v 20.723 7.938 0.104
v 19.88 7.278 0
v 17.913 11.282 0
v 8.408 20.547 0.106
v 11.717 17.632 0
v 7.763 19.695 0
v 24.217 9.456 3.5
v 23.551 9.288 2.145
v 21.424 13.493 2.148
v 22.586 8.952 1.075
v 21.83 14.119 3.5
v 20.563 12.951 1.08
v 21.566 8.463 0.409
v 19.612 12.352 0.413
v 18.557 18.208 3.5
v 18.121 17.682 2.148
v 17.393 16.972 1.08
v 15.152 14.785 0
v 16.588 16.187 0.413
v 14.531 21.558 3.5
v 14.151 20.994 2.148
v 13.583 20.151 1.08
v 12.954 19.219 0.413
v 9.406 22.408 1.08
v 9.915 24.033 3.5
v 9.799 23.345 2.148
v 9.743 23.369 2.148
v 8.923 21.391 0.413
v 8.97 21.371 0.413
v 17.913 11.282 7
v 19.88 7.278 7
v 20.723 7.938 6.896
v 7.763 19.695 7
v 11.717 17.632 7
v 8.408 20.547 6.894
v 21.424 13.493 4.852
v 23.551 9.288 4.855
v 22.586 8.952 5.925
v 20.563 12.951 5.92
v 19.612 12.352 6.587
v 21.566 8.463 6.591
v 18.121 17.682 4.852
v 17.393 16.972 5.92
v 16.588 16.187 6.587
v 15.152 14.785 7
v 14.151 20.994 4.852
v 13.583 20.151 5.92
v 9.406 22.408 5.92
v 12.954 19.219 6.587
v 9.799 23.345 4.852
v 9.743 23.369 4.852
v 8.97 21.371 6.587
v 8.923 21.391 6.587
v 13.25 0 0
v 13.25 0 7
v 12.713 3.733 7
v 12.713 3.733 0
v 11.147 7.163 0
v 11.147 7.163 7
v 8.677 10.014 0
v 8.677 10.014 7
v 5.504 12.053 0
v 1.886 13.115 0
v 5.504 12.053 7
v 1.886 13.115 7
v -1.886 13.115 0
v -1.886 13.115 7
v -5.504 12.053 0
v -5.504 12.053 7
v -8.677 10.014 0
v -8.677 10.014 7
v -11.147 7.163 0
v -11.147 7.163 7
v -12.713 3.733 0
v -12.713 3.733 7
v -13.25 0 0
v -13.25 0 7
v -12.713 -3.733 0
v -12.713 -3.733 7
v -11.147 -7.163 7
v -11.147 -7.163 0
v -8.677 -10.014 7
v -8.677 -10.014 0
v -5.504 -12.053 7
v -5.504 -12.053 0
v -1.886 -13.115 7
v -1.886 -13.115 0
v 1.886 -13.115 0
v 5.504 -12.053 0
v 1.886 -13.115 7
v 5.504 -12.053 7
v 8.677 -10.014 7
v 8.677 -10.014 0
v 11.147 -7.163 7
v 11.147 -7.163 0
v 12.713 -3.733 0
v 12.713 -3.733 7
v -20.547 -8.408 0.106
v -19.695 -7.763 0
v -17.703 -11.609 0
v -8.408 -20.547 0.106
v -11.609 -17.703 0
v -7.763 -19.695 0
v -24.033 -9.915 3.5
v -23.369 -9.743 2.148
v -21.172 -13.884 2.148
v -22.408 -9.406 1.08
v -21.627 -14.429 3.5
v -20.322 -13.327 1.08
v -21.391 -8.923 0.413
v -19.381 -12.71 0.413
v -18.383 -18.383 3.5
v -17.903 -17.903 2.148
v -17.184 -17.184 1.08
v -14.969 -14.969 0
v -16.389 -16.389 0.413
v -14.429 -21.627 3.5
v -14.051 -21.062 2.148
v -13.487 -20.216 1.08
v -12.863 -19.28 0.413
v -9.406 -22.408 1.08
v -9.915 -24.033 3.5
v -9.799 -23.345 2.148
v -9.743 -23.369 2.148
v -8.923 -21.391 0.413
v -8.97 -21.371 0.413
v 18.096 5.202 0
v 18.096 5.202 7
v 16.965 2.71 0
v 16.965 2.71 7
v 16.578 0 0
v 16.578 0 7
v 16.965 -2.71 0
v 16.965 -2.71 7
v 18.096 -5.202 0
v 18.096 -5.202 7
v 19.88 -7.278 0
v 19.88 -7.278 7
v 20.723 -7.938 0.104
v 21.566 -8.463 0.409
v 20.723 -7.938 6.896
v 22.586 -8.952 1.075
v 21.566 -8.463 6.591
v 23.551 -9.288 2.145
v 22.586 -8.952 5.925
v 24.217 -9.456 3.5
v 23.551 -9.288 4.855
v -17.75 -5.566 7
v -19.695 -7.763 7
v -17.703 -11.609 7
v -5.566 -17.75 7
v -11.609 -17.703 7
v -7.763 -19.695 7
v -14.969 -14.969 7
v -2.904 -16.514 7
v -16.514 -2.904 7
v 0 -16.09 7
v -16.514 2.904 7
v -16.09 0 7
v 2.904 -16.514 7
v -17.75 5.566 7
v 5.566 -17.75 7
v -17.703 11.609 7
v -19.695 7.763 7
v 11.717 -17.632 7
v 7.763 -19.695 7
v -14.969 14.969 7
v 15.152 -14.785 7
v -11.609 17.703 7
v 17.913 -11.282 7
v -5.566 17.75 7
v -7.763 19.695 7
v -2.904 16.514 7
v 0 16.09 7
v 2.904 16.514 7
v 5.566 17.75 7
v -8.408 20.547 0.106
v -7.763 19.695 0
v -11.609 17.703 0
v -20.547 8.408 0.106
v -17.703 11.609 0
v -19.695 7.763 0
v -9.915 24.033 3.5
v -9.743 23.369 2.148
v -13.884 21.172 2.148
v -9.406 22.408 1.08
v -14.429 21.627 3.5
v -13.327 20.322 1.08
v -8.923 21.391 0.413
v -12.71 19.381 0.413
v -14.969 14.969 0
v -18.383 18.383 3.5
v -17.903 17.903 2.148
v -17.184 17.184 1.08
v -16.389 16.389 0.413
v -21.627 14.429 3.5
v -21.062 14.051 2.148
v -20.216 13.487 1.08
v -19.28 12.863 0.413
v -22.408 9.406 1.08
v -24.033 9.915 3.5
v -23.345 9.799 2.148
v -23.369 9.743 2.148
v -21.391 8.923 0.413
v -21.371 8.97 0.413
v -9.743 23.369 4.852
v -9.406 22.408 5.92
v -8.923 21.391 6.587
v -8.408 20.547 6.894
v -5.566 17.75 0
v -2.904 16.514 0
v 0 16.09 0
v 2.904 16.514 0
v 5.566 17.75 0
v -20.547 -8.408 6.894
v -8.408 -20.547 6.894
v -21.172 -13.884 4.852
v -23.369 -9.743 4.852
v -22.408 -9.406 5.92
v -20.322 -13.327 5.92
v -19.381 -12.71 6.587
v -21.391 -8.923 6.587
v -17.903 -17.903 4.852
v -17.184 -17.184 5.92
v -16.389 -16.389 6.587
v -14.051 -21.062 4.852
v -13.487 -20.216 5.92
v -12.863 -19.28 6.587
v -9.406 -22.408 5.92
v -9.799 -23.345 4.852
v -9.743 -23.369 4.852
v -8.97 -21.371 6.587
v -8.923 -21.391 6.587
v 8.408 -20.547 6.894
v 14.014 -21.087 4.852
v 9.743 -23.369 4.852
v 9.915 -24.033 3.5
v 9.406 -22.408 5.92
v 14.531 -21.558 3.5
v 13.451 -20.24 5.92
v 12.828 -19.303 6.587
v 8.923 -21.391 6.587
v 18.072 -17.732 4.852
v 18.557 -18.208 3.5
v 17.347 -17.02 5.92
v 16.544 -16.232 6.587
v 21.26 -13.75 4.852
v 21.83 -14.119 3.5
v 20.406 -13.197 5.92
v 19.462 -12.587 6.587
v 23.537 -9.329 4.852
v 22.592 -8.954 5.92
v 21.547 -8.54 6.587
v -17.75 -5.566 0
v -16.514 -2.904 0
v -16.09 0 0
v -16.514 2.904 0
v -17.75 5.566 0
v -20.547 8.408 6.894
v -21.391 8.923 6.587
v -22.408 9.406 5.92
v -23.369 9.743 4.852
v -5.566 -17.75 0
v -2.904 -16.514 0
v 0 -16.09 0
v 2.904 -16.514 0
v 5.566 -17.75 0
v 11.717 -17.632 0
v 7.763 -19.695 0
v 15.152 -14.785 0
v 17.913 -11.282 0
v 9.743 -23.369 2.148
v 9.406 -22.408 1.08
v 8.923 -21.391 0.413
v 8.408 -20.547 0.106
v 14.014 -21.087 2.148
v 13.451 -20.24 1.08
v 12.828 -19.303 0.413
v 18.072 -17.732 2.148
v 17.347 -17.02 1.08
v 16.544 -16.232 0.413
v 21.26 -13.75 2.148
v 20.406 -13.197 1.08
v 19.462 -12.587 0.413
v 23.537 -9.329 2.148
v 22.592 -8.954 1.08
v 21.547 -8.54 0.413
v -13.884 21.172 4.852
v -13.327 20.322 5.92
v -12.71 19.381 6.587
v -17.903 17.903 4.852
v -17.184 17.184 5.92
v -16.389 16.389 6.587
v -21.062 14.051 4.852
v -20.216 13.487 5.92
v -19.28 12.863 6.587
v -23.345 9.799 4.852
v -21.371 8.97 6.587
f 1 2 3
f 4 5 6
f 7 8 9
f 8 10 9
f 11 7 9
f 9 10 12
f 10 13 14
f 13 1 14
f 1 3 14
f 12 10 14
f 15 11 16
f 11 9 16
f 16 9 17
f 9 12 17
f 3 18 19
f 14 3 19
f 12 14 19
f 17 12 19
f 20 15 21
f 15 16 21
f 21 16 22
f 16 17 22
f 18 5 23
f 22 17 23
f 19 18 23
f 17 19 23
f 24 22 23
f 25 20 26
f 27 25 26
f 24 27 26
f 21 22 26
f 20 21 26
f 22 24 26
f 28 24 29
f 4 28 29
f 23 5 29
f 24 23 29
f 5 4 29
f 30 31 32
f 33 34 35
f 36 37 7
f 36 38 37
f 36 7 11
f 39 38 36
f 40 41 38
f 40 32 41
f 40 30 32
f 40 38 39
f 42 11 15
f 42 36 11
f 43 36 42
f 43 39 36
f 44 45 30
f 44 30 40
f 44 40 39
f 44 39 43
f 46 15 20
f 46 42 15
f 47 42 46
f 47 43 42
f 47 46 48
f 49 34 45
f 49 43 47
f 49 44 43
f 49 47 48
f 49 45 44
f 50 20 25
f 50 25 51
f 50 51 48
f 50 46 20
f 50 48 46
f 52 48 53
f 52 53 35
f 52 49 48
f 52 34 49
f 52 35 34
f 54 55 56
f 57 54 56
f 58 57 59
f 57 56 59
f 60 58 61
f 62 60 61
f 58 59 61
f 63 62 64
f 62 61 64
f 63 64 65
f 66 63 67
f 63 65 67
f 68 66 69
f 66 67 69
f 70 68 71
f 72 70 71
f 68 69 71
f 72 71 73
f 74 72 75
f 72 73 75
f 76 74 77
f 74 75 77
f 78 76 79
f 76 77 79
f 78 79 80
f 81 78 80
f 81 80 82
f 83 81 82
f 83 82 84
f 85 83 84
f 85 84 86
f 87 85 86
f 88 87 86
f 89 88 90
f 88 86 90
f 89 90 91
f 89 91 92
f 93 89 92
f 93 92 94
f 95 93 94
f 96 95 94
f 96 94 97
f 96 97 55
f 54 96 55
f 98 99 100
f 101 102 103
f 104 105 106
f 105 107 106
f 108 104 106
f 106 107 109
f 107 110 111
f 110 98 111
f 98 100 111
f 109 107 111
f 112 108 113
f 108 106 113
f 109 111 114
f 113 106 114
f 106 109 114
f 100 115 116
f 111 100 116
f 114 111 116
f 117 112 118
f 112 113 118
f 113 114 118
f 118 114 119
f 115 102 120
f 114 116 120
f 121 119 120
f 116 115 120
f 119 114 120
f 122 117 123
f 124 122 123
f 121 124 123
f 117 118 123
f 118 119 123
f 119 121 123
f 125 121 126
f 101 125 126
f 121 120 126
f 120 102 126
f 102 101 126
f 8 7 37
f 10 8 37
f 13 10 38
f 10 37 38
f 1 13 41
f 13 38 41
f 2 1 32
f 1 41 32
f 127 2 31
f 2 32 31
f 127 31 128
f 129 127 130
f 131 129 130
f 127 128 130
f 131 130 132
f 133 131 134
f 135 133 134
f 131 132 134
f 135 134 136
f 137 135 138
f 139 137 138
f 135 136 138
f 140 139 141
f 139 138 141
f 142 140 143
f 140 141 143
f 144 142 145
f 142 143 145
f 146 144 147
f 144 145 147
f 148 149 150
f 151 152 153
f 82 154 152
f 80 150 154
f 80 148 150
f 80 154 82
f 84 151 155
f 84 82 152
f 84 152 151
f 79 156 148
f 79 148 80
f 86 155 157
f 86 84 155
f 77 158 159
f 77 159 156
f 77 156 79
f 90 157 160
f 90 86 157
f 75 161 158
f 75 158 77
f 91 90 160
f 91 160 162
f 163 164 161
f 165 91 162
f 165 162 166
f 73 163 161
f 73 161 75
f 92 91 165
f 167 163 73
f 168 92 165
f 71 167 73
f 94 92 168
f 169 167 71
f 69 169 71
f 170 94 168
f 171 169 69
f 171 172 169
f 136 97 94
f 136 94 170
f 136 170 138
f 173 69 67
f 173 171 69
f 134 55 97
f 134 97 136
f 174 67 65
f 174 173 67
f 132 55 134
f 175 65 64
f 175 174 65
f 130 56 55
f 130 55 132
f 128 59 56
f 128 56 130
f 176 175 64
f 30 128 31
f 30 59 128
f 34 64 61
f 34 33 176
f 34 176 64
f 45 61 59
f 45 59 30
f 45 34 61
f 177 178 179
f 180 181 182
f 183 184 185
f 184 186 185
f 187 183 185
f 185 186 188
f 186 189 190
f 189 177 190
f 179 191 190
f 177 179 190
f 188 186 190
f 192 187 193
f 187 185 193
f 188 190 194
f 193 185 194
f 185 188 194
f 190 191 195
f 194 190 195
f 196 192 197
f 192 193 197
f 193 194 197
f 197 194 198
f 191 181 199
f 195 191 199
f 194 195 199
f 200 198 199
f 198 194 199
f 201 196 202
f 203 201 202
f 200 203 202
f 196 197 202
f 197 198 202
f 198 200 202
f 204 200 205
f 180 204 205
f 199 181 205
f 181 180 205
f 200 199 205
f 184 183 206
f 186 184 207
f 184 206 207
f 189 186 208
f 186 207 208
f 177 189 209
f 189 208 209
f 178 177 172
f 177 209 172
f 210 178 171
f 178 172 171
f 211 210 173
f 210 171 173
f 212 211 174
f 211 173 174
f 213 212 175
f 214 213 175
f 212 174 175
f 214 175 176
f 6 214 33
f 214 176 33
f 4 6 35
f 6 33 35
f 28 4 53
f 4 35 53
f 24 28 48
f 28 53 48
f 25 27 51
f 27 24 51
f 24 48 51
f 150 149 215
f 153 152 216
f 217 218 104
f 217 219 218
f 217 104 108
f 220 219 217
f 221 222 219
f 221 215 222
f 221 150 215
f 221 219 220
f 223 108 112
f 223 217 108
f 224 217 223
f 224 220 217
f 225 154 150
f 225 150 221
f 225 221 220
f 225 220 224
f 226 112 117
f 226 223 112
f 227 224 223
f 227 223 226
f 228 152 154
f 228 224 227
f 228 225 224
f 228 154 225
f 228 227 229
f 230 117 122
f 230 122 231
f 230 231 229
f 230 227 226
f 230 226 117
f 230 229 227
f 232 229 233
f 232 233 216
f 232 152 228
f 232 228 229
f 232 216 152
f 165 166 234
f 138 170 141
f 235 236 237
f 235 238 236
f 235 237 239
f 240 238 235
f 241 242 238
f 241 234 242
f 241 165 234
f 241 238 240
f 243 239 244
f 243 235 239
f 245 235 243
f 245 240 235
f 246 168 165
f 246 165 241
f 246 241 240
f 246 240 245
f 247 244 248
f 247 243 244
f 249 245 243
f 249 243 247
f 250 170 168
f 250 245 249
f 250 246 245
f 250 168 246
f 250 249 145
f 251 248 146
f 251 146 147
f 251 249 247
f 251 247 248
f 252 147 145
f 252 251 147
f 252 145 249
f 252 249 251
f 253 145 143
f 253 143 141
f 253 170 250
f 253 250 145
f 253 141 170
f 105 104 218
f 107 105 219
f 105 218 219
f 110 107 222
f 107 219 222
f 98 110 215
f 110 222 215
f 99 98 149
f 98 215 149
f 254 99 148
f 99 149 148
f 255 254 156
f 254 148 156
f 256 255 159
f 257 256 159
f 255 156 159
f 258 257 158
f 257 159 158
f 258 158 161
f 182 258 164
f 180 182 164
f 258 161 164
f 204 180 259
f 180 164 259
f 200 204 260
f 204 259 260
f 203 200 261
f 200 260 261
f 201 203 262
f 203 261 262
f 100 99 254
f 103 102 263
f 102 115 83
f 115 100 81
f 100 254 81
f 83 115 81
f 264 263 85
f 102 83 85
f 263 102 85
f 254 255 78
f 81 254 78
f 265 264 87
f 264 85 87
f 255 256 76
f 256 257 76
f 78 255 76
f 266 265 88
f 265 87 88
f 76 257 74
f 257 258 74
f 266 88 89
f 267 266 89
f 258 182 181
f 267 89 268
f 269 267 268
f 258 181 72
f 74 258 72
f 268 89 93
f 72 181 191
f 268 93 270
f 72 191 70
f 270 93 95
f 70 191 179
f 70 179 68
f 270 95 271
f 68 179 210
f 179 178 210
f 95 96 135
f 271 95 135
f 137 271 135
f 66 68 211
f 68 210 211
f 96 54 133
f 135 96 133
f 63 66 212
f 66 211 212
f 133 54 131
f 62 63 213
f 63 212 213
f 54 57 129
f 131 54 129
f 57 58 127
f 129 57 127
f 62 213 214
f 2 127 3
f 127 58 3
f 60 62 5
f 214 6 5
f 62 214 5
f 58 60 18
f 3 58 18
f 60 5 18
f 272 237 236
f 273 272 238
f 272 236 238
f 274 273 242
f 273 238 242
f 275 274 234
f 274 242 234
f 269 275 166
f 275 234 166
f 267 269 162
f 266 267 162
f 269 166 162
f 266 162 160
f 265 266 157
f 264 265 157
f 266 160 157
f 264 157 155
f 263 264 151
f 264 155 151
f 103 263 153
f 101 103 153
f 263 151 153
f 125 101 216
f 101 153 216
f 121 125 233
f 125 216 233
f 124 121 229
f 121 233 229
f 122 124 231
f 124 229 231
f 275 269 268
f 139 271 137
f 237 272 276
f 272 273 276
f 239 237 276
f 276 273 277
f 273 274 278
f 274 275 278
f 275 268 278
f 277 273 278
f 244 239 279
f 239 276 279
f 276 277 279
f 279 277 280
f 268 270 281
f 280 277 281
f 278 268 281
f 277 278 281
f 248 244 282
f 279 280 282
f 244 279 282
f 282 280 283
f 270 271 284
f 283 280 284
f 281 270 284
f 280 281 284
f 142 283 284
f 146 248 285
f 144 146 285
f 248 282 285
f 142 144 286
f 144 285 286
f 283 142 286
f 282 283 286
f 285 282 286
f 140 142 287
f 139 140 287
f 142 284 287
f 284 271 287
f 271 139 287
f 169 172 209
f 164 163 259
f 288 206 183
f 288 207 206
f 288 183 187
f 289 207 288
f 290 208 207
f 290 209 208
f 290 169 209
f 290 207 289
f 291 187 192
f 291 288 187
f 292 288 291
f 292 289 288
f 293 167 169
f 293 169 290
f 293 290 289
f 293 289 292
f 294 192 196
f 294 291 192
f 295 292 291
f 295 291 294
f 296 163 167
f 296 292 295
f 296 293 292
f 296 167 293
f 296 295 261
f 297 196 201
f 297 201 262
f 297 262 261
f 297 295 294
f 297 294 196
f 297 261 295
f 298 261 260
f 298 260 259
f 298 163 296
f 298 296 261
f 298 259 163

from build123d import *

# Parameters (mm, degrees)
F0_R         = 26.25
F1_DEPTH     = 7
F2_R         = 13.25
F3_DEPTH     = 25.4
F4_R         = 10.16
F4_R_2       = 9.6723514766
F5_DEPTH     = 25.4
F6_T2_ANGLE  = 101.8963155292
F6_T4_ANGLE  = 100.8121389037
F6_T6_ANGLE  = 100.8121389037
F6_T8_ANGLE  = 100.8121389037
F6_T10_ANGLE = 100.8121389037
F6_T12_ANGLE = 101.8963155292
F6_T14_ANGLE = 101.8963155292
F6_T16_ANGLE = 101.8963155292


# Not quite as in the source:
# - a fillet or chamfer that OpenCascade refuses, or shapes differently, is made with other operations: its cross-section is extruded or revolved along the edge and cut away or added


with BuildPart() as f1:
    # F0 (on Top) → F1 (new body)
    with BuildSketch(Plane.XY):
        Circle(F0_R)
    extrude(amount=F1_DEPTH)

    # F2 (on face) → F3 (cut)
    with BuildSketch(Plane.XY.offset(7)):
        Circle(F2_R)
    extrude(amount=-F3_DEPTH, mode=Mode.SUBTRACT)

    # F4 (on face) → F5 (cut)
    with BuildSketch(Plane.XY.offset(7)):
        with Locations((0, -26.25)):
            Circle(F4_R)
        with Locations((-26.25, 0)):
            Circle(F4_R)
        with Locations((0, 26.25)):
            Circle(F4_R)
        with Locations((26.25, 0)):
            Circle(F4_R_2)
    extrude(amount=-F5_DEPTH, mode=Mode.SUBTRACT)

    # F6: fillet of radius 5.08 on 8 edges, made by hand

    # F6_s1 → F6_t2 (revolve, cut)
    with BuildSketch(Plane(origin=(0, 0, 0), x_dir=(0, 0, 1), z_dir=(-0.995551765, 0.0942161515, 0))):
        with BuildLine():
            ThreePointArc((5.08, -26.25), (1.4878975516, -24.7621024484), (0, -21.17))
            Line((0, -21.17), (0, -26.25))
            Line((0, -26.25), (5.08, -26.25))
        make_face()
    revolve(axis=Axis((0, 0, 0), (0, 0, 1)), revolution_arc=F6_T2_ANGLE, mode=Mode.SUBTRACT)

    # F6_s3 → F6_t4 (revolve, cut)
    with BuildSketch(Plane(origin=(0, 0, 0), x_dir=(0, 0, 1), z_dir=(0.0942137746, 0.9955519899, 0))):
        with BuildLine():
            ThreePointArc((5.08, -26.25), (1.4878975516, -24.7621024484), (0, -21.17))
            Line((0, -21.17), (0, -26.25))
            Line((0, -26.25), (5.08, -26.25))
        make_face()
    revolve(axis=Axis((0, 0, 0), (0, 0, 1)), revolution_arc=F6_T4_ANGLE, mode=Mode.SUBTRACT)

    # F6_s5 → F6_t6 (revolve, cut)
    with BuildSketch(Plane(origin=(0, 0, 0), x_dir=(0, 0, 1), z_dir=(0.9955519899, -0.0942137746, 0))):
        with BuildLine():
            ThreePointArc((5.08, -26.25), (1.4878975516, -24.7621024484), (0, -21.17))
            Line((0, -21.17), (0, -26.25))
            Line((0, -26.25), (5.08, -26.25))
        make_face()
    revolve(axis=Axis((0, 0, 0), (0, 0, 1)), revolution_arc=F6_T6_ANGLE, mode=Mode.SUBTRACT)

    # F6_s7 → F6_t8 (revolve, cut)
    with BuildSketch(Plane(origin=(0, 0, 0), x_dir=(0, 0, 1), z_dir=(0.9955519899, -0.0942137746, 0))):
        with BuildLine():
            ThreePointArc((1.92, -26.25), (5.5121024484, -24.7621024484), (7, -21.17))
            Line((7, -21.17), (7, -26.25))
            Line((7, -26.25), (1.92, -26.25))
        make_face()
    revolve(axis=Axis((0, 0, 7), (0, 0, 1)), revolution_arc=F6_T8_ANGLE, mode=Mode.SUBTRACT)

    # F6_s9 → F6_t10 (revolve, cut)
    with BuildSketch(Plane(origin=(0, 0, 0), x_dir=(0, 0, 1), z_dir=(0.0942137746, 0.9955519899, 0))):
        with BuildLine():
            ThreePointArc((1.92, -26.25), (5.5121024484, -24.7621024484), (7, -21.17))
            Line((7, -21.17), (7, -26.25))
            Line((7, -26.25), (1.92, -26.25))
        make_face()
    revolve(axis=Axis((0, 0, 7), (0, 0, 1)), revolution_arc=F6_T10_ANGLE, mode=Mode.SUBTRACT)

    # F6_s11 → F6_t12 (revolve, cut)
    with BuildSketch(Plane(origin=(0, 0, 0), x_dir=(0, 0, 1), z_dir=(-0.995551765, 0.0942161515, 0))):
        with BuildLine():
            ThreePointArc((1.92, -26.25), (5.5121024484, -24.7621024484), (7, -21.17))
            Line((7, -21.17), (7, -26.25))
            Line((7, -26.25), (1.92, -26.25))
        make_face()
    revolve(axis=Axis((0, 0, 7), (0, 0, 1)), revolution_arc=F6_T12_ANGLE, mode=Mode.SUBTRACT)

    # F6_s13 → F6_t14 (revolve, cut)
    with BuildSketch(Plane(origin=(0, 0, 0), x_dir=(0, 0, 1), z_dir=(-0.1130316961, -0.9935913826, 0))):
        with BuildLine():
            ThreePointArc((1.92, -26.25), (5.5121024484, -24.7621024484), (7, -21.17))
            Line((7, -21.17), (7, -26.25))
            Line((7, -26.25), (1.92, -26.25))
        make_face()
    revolve(axis=Axis((0, 0, 7), (0, 0, 1)), revolution_arc=F6_T14_ANGLE, mode=Mode.SUBTRACT)

    # F6_s15 → F6_t16 (revolve, cut)
    with BuildSketch(Plane(origin=(0, 0, 0), x_dir=(0, 0, 1), z_dir=(-0.1130316961, -0.9935913826, 0))):
        with BuildLine():
            ThreePointArc((5.08, -26.25), (1.4878975516, -24.7621024484), (0, -21.17))
            Line((0, -21.17), (0, -26.25))
            Line((0, -26.25), (5.08, -26.25))
        make_face()
    revolve(axis=Axis((0, 0, 0), (0, 0, 1)), revolution_arc=F6_T16_ANGLE, mode=Mode.SUBTRACT)


solid = f1.part
